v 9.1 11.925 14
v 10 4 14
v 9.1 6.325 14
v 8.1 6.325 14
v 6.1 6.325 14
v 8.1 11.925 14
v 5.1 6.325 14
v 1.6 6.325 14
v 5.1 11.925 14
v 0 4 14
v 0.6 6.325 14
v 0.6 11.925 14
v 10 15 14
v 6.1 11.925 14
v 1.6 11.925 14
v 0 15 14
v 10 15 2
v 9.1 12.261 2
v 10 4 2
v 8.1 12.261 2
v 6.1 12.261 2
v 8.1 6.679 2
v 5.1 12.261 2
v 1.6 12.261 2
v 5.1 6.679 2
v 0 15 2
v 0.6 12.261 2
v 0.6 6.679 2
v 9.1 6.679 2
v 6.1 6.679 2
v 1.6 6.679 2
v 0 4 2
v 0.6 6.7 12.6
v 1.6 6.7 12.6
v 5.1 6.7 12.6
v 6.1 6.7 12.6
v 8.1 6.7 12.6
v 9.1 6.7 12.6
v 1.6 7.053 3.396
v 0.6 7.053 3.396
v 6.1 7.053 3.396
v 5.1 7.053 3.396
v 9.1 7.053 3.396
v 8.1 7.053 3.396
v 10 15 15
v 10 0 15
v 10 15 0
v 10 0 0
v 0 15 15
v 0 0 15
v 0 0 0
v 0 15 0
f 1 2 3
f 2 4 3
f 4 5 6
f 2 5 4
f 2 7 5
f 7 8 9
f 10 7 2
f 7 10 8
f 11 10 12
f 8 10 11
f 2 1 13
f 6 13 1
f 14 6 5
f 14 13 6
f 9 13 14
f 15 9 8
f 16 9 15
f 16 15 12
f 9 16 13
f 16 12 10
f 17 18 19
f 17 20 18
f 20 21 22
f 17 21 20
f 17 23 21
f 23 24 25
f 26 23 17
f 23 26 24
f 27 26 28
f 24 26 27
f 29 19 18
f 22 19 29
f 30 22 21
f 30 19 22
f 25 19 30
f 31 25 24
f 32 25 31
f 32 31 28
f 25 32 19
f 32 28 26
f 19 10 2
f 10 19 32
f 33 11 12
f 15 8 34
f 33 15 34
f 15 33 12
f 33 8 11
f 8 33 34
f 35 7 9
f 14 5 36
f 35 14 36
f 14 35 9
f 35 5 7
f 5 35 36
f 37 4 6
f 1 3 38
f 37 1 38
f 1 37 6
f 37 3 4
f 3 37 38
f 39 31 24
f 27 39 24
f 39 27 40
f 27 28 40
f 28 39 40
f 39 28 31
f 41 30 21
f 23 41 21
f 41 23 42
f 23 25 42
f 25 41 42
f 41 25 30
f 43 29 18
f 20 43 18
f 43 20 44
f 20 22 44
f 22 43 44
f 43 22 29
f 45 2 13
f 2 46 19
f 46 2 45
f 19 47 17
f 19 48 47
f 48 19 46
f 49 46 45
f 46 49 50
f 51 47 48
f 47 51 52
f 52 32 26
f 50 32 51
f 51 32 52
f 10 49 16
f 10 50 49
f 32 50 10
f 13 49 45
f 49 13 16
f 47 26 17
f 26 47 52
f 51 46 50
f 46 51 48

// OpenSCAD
// file: ../../template/greenhouse/dripsystem_dripper_neg.scad
module _inner_upper_holder(space) {
    translate([space,2.7,10.6]) {
        rotate([15,0,0]) {
            cube([1, 6, 6]);
        }
    }
}

module _inner_lower_holder(space) {
    translate([space,1.5,-4.4]) {
        rotate([-15,0,0]) {
            cube([1, 6, 6]);
        }
    }
}


module dripsystem_dripper_neg() {
    difference() {
        cube([11.5, 11.5,12]);
        _inner_upper_holder(1.6);
        _inner_upper_holder(6.1);
        _inner_upper_holder(9.1);

        _inner_lower_holder(1.6);
        _inner_lower_holder(6.1);
        _inner_lower_holder(9.1);

    }



}

dripsystem_dripper_neg();
// main file
use <../../template/greenhouse/dripsystem_dripper_neg.scad>
difference() {
    cube([10, 15, 15]);
    translate([-1, 4, 2])
        dripsystem_dripper_neg();
}
